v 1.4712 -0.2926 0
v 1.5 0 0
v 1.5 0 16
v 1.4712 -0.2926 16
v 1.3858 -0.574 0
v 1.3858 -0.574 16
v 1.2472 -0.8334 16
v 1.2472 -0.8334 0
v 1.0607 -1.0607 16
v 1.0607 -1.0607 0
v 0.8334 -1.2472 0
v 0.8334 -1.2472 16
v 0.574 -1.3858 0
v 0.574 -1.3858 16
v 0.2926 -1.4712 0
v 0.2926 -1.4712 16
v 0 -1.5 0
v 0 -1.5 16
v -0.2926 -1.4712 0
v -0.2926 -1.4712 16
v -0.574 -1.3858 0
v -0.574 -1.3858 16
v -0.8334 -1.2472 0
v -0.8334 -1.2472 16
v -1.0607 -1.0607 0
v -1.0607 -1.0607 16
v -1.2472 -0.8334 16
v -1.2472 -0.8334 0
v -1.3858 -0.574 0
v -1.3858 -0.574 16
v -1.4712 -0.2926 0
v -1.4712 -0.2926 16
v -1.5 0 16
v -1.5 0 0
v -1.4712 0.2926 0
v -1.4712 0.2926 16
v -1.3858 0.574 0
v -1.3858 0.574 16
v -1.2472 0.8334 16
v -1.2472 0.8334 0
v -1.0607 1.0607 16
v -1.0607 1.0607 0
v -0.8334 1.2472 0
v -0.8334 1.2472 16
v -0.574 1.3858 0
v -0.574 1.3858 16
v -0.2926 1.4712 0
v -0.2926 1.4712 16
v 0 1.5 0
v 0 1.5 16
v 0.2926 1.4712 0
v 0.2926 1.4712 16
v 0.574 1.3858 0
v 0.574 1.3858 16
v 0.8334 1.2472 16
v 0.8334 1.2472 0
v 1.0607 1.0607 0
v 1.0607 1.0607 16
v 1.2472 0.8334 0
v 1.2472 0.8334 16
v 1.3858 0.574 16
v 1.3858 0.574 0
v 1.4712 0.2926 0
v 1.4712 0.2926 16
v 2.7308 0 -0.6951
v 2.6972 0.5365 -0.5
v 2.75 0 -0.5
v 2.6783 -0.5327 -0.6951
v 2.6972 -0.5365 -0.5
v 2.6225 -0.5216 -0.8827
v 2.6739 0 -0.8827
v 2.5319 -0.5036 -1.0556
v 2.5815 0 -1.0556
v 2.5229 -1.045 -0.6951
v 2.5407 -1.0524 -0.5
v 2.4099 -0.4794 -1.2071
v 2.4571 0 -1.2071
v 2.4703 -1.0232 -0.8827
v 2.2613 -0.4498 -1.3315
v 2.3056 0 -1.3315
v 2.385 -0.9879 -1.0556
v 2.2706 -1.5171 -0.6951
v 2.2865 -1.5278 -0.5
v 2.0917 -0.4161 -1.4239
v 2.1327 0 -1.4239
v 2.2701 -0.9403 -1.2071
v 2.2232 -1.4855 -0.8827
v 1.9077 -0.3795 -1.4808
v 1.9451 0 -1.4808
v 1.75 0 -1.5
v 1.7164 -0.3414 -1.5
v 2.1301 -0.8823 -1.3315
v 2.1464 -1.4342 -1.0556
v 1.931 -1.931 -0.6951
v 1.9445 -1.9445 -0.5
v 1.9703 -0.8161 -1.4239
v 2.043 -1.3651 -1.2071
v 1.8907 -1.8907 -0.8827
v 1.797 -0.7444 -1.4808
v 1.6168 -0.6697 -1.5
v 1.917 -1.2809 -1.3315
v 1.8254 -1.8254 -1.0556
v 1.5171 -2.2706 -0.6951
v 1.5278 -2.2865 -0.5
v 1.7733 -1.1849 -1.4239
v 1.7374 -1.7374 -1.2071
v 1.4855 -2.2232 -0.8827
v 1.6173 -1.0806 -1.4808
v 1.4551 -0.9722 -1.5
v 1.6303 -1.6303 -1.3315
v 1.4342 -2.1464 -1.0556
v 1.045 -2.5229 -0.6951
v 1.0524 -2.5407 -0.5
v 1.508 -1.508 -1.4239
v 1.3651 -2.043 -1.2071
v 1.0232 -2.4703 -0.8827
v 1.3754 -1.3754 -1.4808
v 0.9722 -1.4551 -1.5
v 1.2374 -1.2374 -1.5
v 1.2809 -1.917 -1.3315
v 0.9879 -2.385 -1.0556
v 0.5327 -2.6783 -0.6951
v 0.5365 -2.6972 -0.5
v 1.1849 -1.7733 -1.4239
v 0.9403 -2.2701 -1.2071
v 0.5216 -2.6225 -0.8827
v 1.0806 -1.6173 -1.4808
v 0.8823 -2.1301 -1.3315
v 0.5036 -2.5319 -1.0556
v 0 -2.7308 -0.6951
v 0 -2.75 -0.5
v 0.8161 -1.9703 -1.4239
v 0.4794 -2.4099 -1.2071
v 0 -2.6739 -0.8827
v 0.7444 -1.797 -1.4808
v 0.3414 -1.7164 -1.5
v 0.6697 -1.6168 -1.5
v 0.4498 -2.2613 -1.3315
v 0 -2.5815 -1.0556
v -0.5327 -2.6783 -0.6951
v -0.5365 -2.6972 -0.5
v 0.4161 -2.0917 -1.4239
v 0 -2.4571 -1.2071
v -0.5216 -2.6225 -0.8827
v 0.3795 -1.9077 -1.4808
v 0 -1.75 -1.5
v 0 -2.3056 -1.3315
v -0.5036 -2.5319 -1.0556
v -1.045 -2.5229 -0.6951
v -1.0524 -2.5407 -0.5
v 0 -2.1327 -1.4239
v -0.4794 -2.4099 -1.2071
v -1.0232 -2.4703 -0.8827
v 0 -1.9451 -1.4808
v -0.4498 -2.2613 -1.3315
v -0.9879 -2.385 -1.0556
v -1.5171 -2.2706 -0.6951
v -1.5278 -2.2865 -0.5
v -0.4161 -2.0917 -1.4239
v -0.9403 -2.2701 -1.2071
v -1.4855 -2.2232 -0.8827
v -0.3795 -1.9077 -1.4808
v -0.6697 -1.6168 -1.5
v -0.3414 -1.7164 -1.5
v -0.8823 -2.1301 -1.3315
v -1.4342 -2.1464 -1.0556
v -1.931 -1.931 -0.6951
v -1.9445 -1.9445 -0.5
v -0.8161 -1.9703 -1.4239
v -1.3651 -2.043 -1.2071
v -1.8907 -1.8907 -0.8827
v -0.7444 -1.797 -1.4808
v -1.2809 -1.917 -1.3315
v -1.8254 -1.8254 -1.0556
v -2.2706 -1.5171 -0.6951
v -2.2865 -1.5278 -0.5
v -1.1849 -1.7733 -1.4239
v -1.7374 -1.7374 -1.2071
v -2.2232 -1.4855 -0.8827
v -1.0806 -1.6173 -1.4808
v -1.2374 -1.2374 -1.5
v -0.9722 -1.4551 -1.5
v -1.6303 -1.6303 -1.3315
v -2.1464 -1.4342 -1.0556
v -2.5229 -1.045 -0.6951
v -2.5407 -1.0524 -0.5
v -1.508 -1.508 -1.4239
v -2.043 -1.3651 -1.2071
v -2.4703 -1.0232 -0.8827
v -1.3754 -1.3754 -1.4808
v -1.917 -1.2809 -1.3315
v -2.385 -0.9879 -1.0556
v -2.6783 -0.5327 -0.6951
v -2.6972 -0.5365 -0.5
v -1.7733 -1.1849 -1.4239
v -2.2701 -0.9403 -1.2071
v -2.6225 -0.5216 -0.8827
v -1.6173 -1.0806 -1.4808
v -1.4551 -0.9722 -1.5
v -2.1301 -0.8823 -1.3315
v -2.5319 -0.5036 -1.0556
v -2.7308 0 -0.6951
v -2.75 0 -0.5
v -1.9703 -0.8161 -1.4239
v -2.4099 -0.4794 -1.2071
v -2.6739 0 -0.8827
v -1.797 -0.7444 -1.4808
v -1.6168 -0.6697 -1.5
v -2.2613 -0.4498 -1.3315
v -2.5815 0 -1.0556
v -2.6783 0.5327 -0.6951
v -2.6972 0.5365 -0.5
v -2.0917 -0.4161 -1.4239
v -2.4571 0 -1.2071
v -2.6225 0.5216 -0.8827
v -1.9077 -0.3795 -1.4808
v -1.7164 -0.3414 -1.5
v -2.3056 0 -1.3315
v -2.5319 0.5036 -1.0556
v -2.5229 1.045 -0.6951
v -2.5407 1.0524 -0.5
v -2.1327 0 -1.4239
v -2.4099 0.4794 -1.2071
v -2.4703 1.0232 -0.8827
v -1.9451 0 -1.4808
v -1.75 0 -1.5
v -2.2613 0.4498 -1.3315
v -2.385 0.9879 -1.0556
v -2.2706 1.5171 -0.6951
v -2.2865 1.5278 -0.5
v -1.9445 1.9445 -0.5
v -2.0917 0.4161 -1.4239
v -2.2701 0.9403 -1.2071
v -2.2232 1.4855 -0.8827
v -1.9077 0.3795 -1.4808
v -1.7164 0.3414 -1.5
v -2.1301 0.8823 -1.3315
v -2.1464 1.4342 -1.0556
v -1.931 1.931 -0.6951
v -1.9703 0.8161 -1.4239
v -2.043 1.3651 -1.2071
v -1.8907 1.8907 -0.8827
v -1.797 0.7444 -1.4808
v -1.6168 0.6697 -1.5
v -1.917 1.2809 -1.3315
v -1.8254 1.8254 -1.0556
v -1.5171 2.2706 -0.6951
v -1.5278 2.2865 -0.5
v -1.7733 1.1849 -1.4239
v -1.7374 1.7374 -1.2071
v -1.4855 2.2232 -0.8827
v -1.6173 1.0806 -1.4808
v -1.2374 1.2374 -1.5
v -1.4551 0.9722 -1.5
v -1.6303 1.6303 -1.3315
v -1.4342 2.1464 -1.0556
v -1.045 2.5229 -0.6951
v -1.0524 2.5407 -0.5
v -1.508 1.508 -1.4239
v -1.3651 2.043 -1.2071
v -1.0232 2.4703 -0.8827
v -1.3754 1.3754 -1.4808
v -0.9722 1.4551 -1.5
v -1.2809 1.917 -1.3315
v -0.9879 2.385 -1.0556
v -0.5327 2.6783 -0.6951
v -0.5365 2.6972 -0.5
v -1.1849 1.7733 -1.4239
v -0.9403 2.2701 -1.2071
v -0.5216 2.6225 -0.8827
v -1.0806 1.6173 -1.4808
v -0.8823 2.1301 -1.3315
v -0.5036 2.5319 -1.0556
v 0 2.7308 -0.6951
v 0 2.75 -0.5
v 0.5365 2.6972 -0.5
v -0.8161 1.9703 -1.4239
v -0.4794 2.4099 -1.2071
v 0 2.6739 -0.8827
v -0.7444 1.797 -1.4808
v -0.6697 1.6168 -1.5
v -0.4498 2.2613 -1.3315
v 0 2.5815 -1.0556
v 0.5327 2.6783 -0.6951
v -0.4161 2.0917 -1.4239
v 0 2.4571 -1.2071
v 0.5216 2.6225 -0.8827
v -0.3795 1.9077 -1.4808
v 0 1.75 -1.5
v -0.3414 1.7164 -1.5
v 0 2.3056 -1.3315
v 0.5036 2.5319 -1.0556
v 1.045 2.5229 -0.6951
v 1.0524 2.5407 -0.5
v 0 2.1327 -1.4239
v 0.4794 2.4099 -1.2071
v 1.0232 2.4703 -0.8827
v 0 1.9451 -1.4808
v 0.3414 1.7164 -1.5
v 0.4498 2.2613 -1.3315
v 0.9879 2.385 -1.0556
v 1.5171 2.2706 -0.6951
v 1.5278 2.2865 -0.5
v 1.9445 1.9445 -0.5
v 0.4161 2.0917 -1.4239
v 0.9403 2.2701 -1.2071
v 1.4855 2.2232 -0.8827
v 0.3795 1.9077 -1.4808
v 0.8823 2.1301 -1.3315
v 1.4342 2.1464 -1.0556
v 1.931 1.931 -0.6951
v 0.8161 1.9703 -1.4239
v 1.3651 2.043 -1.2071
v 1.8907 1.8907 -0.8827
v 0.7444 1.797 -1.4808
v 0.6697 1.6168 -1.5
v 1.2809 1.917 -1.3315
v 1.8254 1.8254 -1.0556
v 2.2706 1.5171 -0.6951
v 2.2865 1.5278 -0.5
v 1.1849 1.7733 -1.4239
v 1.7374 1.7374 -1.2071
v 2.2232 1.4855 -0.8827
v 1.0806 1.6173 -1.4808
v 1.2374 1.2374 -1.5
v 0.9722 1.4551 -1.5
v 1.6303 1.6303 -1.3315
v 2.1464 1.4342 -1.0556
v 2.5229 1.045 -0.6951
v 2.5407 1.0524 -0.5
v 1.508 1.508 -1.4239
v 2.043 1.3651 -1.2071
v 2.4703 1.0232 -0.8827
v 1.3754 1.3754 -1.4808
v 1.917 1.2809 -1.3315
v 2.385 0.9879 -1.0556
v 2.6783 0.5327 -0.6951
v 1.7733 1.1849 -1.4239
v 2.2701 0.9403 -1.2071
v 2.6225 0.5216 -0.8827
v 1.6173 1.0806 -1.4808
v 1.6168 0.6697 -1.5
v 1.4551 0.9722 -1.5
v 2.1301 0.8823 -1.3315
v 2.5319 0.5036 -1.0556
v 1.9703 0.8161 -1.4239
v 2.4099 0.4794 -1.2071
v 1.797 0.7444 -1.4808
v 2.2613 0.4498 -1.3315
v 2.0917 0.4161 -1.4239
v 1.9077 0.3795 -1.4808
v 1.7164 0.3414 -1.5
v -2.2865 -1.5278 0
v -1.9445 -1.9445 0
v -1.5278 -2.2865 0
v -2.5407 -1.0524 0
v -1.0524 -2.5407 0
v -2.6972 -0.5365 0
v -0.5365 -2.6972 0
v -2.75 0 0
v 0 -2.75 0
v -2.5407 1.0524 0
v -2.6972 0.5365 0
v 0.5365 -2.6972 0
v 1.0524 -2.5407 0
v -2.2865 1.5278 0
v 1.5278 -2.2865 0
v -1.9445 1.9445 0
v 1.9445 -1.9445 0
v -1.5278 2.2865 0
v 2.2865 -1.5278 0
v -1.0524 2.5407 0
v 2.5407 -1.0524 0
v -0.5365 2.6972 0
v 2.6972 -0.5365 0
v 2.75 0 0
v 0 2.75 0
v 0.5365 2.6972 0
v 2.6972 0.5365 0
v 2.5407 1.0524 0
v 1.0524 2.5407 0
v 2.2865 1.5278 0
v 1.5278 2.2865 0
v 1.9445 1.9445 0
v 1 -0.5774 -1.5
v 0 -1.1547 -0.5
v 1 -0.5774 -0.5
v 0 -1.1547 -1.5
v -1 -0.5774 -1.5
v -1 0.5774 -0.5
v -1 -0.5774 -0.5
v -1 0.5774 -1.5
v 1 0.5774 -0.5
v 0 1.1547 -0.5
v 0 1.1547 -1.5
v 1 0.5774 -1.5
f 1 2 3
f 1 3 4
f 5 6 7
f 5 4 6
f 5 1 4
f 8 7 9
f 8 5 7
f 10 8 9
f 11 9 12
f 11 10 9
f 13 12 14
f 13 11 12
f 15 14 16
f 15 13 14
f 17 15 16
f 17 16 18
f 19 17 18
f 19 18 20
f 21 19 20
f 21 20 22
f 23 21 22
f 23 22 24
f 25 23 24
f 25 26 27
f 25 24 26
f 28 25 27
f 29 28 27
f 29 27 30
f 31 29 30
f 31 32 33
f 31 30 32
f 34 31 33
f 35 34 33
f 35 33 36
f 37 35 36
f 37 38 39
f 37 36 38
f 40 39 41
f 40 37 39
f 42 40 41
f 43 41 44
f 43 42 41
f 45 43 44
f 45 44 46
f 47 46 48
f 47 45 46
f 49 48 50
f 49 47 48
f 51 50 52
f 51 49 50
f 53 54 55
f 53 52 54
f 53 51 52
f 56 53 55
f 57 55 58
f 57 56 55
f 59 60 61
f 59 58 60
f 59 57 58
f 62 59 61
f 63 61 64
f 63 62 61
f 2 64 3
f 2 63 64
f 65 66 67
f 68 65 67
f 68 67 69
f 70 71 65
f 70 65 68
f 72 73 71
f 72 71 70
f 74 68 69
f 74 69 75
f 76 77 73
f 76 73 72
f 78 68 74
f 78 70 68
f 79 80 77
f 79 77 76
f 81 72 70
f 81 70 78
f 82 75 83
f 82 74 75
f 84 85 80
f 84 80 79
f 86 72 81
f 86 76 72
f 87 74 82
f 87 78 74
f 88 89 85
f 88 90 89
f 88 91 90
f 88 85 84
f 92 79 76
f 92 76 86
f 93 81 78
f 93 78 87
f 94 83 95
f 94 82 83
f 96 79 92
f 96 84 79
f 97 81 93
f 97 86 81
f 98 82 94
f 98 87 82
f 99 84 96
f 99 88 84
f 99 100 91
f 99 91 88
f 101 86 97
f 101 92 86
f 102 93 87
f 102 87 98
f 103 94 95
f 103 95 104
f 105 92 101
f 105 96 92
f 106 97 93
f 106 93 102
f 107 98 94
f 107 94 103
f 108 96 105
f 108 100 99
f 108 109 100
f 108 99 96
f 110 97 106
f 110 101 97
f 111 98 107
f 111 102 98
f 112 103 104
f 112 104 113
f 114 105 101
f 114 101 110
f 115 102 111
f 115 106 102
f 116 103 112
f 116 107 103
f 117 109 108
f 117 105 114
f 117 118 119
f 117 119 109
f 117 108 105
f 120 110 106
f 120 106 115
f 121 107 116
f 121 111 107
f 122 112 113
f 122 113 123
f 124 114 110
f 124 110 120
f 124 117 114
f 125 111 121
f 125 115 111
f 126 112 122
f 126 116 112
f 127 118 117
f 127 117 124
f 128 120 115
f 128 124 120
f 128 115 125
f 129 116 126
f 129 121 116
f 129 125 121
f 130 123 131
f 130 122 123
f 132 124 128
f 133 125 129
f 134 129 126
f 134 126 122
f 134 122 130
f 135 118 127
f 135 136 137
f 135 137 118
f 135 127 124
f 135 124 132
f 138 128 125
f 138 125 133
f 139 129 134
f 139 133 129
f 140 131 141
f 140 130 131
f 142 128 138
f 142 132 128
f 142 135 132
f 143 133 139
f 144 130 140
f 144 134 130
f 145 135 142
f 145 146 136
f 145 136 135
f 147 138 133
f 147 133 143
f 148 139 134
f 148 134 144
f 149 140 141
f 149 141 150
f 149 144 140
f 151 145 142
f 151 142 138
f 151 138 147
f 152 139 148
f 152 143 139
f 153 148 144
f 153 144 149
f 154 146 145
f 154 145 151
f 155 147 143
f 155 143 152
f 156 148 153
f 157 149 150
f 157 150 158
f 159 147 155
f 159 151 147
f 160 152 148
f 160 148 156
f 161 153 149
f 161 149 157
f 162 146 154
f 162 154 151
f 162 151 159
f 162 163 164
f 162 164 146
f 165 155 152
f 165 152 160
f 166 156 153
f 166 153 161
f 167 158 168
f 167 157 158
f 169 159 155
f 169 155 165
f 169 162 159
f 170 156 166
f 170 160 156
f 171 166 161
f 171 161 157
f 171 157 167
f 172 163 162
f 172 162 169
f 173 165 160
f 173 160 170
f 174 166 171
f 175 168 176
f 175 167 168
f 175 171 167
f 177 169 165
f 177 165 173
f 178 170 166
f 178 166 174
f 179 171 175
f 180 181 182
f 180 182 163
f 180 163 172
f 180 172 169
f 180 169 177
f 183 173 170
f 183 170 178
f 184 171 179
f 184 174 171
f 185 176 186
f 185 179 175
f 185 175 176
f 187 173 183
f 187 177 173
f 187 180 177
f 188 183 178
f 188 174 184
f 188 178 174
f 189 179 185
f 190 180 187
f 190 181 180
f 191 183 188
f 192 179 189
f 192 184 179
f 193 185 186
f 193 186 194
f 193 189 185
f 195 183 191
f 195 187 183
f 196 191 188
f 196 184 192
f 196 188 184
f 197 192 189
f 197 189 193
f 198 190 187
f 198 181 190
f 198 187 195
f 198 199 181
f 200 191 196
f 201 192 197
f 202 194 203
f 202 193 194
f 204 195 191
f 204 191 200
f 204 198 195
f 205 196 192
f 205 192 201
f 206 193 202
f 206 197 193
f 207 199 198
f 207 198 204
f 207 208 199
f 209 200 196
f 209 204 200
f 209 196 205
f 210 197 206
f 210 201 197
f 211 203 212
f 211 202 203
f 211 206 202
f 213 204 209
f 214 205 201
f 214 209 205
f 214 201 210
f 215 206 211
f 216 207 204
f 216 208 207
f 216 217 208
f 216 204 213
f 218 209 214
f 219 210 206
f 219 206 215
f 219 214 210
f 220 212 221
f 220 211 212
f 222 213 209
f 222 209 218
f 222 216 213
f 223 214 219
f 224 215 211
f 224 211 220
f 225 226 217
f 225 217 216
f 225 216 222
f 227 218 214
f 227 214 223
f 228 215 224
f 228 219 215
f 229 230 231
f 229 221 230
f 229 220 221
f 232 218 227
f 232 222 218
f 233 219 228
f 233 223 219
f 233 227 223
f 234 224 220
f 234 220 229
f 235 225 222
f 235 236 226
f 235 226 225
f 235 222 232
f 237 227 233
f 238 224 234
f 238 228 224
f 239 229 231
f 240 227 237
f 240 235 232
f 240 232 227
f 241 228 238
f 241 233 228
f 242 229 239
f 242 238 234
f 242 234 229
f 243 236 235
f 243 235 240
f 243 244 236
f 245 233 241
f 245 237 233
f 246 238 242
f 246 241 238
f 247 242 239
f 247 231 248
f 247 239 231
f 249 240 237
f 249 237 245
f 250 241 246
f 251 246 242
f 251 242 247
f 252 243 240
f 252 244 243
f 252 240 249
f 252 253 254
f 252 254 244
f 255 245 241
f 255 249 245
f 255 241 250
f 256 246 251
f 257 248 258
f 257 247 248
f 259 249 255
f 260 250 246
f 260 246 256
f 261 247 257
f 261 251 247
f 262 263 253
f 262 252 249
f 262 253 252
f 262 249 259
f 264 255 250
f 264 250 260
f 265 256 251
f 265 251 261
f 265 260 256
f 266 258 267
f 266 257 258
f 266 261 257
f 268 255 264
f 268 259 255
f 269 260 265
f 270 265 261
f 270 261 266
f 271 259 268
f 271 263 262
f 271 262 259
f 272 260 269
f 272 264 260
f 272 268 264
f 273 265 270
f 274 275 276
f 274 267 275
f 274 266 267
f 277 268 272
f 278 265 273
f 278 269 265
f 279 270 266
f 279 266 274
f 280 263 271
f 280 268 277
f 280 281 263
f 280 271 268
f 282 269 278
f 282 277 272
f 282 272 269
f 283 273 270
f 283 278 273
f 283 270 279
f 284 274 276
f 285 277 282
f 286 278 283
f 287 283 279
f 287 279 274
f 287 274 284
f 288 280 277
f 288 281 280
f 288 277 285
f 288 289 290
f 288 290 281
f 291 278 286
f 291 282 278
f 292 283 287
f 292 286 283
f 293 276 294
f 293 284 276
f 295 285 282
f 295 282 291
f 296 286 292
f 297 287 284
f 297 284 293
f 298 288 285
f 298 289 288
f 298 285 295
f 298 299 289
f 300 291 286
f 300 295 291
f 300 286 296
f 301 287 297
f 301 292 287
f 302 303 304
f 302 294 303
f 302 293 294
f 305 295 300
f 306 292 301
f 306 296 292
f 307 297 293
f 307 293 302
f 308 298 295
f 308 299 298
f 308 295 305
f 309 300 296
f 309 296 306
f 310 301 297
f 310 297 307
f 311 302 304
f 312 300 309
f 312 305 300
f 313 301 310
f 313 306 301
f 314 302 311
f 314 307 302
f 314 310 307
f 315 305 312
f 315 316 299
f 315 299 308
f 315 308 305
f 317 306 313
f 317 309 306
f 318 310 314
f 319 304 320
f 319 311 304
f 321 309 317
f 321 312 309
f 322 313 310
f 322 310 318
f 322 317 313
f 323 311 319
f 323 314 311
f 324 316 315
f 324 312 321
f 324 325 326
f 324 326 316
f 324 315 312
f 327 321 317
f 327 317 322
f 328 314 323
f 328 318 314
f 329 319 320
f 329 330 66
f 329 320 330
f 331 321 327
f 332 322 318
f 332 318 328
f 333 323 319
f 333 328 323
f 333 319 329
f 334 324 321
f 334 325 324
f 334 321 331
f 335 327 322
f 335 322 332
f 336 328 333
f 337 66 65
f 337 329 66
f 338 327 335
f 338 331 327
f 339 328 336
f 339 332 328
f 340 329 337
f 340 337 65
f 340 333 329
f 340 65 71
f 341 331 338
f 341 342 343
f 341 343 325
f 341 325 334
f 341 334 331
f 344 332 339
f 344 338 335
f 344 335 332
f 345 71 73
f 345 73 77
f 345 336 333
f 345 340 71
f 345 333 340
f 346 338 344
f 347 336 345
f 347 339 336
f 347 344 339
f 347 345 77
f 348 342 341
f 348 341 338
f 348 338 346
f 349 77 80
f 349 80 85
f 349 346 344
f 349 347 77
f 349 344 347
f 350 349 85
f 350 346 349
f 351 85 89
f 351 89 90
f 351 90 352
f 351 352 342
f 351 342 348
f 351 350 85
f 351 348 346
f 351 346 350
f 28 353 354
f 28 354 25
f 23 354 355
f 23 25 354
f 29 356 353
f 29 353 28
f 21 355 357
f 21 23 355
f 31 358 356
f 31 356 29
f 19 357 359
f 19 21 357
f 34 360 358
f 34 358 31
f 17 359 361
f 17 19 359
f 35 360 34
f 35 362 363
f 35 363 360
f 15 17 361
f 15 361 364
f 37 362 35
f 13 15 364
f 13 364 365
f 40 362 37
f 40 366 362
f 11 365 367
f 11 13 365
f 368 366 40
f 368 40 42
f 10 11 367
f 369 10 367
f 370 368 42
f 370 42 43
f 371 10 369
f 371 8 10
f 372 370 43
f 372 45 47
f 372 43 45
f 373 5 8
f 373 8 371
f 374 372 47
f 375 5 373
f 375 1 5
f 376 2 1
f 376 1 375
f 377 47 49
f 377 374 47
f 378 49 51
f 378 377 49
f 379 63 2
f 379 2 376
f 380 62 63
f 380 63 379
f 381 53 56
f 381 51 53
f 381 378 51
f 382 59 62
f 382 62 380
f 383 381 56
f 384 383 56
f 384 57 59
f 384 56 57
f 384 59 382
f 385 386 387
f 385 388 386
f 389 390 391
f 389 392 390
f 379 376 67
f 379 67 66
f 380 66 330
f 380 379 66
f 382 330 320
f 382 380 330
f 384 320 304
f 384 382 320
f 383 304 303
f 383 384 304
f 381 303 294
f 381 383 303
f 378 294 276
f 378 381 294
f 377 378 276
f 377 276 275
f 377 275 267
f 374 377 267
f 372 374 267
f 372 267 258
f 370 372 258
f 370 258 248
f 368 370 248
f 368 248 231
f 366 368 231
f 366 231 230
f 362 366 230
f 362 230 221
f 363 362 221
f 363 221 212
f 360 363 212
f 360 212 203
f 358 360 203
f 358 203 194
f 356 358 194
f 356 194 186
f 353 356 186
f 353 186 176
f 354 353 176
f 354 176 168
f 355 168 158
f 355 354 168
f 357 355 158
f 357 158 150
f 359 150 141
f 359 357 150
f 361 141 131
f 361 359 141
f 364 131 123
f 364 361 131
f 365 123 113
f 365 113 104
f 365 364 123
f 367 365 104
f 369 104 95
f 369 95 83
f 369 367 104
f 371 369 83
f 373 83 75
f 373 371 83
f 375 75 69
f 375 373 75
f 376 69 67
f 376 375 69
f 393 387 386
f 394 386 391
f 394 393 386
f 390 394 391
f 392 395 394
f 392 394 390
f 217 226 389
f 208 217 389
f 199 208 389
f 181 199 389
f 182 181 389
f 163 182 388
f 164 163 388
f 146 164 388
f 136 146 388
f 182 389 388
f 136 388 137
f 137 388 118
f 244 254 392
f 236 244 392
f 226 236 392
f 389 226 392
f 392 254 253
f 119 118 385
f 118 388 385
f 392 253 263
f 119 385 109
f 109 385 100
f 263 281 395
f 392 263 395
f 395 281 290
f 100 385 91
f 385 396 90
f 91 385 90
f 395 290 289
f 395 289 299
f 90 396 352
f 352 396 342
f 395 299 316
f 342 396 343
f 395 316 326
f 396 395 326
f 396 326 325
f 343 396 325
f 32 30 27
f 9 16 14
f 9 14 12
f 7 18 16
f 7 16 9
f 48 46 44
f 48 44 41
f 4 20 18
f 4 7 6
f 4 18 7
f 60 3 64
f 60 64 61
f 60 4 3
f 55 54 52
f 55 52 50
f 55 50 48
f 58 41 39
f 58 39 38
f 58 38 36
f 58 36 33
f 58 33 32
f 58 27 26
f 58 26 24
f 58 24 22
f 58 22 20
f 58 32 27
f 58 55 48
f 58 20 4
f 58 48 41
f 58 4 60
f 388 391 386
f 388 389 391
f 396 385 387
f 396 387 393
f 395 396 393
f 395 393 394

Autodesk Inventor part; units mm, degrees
ref_plane "YZ Plane" through (0, 0, 0) normal (1, 0, 0) x (0, 1, 0)
ref_plane "XZ Plane" through (0, 0, 0) normal (0, 1, 0) x (-1, 0, 0)
ref_plane "XY Plane" through (0, 0, 0) normal (0, 0, 1) x (1, 0, 0)
sketch "Эскиз1" plane through (0, 0, 0) normal (0, 0, 1) x (1, 0, 0)
  circle A0 centre (0, 0) radius 1.5
  circle A1 centre (0, 0) radius 2.75
  dimension "d0" = 5.5
  dimension "d1" = 3
extrude "Выдавливание1" add sketch "Эскиз1" along normal blind 16 contours A0
extrude "Выдавливание2" add sketch "Эскиз1" against normal blind 1.5 contours A0 | A1
thread "Резьба1" size "M3x0.5" class "6g" standard "ISO Metric profile" full length
sketch "Эскиз2" plane through (0, 0, -1.5) normal (0, 0, -1) x (-1, 0, 0)
  line L0 (0, 1.1547) -> (1, 0.5774)
  line L1 (1, 0.5774) -> (1, -0.5774)
  line L2 (1, -0.5774) -> (0, -1.1547)
  line L3 (0, -1.1547) -> (-1, -0.5774)
  line L4 (-1, -0.5774) -> (-1, 0.5774)
  line L5 (-1, 0.5774) -> (0, 1.1547)
  point P0 (0, 0)
  point P1 (0, 0)
  dimension "d8" = 2
extrude "Выдавливание3" cut sketch "Эскиз2" against normal blind 1
fillet "Сопряжение1" radius 1 1 edges at (-2.75, 0, -1.5)
properties part number "Болт М3 16 мм"
